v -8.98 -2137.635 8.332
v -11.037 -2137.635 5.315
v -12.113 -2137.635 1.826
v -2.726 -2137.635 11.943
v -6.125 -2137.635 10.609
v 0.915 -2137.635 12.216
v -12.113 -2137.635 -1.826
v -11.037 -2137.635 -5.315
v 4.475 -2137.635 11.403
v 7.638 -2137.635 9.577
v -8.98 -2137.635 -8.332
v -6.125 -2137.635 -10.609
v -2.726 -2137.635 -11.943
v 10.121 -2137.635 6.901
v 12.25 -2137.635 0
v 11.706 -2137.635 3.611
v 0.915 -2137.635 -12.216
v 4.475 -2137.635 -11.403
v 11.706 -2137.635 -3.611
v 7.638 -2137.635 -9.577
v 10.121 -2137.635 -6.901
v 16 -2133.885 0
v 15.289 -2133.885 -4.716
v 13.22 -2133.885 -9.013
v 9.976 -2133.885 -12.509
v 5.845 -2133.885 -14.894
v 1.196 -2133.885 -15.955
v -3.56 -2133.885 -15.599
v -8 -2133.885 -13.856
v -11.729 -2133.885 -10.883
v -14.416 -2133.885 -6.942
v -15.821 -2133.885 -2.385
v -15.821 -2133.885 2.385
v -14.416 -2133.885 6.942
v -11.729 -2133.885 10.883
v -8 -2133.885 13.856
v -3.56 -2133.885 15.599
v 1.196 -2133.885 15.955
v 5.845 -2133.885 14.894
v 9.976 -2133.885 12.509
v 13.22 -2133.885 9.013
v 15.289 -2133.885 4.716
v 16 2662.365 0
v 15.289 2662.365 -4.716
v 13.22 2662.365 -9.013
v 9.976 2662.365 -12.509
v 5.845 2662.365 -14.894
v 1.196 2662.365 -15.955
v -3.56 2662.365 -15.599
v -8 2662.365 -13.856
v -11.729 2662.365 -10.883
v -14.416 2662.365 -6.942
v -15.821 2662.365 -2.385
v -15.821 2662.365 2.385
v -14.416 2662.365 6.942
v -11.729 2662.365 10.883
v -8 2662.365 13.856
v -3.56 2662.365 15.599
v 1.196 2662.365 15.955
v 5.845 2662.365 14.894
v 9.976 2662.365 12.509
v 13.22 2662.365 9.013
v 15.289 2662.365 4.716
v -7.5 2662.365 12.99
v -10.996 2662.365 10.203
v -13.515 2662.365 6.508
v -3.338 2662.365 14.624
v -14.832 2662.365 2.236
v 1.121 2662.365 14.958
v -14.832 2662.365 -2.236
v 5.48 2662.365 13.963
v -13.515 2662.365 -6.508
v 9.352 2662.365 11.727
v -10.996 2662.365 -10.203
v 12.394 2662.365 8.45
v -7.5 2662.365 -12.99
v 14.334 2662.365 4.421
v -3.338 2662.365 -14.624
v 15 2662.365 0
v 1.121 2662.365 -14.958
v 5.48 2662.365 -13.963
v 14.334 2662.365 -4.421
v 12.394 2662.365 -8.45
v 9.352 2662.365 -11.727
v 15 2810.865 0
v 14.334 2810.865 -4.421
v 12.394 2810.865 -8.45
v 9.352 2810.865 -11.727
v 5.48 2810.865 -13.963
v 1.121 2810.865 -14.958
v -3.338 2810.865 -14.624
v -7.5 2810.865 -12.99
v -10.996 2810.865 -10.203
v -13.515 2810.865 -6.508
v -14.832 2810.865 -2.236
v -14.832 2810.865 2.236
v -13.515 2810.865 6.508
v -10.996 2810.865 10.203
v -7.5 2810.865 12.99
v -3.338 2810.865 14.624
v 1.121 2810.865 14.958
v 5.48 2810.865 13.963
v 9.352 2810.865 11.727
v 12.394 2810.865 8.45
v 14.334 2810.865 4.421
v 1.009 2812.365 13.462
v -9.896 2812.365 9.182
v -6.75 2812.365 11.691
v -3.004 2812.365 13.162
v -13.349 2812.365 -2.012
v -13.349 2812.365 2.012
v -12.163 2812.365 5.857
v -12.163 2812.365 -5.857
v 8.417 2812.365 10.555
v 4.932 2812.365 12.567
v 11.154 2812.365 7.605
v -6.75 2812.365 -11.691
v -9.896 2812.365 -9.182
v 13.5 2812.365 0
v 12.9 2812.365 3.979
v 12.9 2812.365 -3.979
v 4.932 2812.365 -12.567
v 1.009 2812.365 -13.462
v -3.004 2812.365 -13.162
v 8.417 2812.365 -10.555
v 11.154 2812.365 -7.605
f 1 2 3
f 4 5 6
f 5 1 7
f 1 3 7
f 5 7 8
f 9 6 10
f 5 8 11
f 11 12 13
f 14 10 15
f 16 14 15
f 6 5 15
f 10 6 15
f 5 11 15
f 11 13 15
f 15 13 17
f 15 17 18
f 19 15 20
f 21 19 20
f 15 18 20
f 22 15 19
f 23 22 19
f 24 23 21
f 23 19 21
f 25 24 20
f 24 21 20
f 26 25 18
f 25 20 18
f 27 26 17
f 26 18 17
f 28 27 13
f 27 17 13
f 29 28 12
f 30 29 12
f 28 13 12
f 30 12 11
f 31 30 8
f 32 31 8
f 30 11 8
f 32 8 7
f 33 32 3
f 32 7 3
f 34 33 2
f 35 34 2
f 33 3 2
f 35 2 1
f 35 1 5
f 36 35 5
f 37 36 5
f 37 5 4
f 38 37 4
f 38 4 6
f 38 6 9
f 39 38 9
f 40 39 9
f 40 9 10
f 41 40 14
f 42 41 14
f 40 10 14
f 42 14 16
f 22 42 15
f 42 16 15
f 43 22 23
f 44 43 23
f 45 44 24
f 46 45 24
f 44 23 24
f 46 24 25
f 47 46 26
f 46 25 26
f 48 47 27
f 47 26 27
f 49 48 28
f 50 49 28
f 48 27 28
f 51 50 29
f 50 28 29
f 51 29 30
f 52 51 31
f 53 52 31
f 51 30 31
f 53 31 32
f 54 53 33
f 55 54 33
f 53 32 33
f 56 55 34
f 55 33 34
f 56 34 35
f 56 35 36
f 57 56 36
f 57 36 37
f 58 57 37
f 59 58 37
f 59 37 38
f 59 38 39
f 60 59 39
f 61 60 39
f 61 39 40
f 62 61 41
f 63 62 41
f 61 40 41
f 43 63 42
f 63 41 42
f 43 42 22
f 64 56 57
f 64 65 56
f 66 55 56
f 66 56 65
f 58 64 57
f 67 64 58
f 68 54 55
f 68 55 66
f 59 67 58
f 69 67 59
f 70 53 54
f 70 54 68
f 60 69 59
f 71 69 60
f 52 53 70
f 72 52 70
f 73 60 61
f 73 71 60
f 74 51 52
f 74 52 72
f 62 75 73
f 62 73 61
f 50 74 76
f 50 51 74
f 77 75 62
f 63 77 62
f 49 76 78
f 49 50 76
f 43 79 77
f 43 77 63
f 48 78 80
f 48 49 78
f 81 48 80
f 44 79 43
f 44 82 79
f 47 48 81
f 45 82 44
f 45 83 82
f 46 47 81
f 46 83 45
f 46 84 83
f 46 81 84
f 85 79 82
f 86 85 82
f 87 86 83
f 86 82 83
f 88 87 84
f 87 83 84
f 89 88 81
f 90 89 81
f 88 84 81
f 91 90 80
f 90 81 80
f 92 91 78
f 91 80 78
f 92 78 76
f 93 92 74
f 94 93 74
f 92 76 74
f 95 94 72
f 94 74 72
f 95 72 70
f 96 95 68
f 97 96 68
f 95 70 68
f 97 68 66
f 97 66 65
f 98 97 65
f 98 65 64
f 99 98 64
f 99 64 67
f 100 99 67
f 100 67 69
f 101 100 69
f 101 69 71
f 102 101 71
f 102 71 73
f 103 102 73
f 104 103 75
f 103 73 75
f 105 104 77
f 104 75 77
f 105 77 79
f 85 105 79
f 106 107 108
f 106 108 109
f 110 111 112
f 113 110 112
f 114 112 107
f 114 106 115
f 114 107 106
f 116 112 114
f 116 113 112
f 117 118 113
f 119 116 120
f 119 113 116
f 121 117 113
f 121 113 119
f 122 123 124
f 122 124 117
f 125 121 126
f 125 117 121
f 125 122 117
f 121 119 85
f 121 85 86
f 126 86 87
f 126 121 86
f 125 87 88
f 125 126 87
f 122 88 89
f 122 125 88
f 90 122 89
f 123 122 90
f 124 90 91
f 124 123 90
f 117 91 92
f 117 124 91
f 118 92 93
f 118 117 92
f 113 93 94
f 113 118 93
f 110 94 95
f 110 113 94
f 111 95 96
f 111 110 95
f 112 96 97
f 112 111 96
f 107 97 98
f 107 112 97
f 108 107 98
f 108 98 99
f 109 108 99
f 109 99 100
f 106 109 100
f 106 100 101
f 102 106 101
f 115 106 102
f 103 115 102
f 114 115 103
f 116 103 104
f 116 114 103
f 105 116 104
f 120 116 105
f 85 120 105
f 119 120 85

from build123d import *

# Parameters (mm, degrees)
SKETCH1_R           = 2.133333333
BOSS_EXTRUDE1_DEPTH = 640
SKETCH2_R           = 2
BOSS_EXTRUDE2_DEPTH = 20
CHAMFER1_SIZE       = 0.2
CHAMFER2_SIZE       = 0.5
SCALE1_SCALE        = 7.5


with BuildPart() as part:
    # Sketch1 → Boss-Extrude1 (new body)
    with BuildSketch(Plane(origin=(0, 0, 0), x_dir=(1, 0, 0), z_dir=(0, 1, 0))):
        Circle(SKETCH1_R)
    extrude(amount=BOSS_EXTRUDE1_DEPTH)

    # Sketch2 → Boss-Extrude2 (add)
    with BuildSketch(Plane(origin=(0, 640, 0), x_dir=(1, 0, 0), z_dir=(0, 1, 0))):
        Circle(SKETCH2_R)
    extrude(amount=BOSS_EXTRUDE2_DEPTH)

    # Chamfer1
    chamfer1_edges = [part.edges().sort_by_distance(p)[0] for p in [
        (-2, 660, 0),
    ]]
    chamfer(chamfer1_edges, length=CHAMFER1_SIZE)

    # Chamfer2
    chamfer2_edges = [part.edges().sort_by_distance(p)[0] for p in [
        (-2.133333333, 0, 0),
    ]]
    chamfer(chamfer2_edges, length=CHAMFER2_SIZE)


with BuildPart() as part_1:
    # Scale1: scaled about (0, 328.866878823, 0)
    add(part.part.scale(SCALE1_SCALE).moved(Location((0, -2137.634712349, 0))))


solid = part_1.part
